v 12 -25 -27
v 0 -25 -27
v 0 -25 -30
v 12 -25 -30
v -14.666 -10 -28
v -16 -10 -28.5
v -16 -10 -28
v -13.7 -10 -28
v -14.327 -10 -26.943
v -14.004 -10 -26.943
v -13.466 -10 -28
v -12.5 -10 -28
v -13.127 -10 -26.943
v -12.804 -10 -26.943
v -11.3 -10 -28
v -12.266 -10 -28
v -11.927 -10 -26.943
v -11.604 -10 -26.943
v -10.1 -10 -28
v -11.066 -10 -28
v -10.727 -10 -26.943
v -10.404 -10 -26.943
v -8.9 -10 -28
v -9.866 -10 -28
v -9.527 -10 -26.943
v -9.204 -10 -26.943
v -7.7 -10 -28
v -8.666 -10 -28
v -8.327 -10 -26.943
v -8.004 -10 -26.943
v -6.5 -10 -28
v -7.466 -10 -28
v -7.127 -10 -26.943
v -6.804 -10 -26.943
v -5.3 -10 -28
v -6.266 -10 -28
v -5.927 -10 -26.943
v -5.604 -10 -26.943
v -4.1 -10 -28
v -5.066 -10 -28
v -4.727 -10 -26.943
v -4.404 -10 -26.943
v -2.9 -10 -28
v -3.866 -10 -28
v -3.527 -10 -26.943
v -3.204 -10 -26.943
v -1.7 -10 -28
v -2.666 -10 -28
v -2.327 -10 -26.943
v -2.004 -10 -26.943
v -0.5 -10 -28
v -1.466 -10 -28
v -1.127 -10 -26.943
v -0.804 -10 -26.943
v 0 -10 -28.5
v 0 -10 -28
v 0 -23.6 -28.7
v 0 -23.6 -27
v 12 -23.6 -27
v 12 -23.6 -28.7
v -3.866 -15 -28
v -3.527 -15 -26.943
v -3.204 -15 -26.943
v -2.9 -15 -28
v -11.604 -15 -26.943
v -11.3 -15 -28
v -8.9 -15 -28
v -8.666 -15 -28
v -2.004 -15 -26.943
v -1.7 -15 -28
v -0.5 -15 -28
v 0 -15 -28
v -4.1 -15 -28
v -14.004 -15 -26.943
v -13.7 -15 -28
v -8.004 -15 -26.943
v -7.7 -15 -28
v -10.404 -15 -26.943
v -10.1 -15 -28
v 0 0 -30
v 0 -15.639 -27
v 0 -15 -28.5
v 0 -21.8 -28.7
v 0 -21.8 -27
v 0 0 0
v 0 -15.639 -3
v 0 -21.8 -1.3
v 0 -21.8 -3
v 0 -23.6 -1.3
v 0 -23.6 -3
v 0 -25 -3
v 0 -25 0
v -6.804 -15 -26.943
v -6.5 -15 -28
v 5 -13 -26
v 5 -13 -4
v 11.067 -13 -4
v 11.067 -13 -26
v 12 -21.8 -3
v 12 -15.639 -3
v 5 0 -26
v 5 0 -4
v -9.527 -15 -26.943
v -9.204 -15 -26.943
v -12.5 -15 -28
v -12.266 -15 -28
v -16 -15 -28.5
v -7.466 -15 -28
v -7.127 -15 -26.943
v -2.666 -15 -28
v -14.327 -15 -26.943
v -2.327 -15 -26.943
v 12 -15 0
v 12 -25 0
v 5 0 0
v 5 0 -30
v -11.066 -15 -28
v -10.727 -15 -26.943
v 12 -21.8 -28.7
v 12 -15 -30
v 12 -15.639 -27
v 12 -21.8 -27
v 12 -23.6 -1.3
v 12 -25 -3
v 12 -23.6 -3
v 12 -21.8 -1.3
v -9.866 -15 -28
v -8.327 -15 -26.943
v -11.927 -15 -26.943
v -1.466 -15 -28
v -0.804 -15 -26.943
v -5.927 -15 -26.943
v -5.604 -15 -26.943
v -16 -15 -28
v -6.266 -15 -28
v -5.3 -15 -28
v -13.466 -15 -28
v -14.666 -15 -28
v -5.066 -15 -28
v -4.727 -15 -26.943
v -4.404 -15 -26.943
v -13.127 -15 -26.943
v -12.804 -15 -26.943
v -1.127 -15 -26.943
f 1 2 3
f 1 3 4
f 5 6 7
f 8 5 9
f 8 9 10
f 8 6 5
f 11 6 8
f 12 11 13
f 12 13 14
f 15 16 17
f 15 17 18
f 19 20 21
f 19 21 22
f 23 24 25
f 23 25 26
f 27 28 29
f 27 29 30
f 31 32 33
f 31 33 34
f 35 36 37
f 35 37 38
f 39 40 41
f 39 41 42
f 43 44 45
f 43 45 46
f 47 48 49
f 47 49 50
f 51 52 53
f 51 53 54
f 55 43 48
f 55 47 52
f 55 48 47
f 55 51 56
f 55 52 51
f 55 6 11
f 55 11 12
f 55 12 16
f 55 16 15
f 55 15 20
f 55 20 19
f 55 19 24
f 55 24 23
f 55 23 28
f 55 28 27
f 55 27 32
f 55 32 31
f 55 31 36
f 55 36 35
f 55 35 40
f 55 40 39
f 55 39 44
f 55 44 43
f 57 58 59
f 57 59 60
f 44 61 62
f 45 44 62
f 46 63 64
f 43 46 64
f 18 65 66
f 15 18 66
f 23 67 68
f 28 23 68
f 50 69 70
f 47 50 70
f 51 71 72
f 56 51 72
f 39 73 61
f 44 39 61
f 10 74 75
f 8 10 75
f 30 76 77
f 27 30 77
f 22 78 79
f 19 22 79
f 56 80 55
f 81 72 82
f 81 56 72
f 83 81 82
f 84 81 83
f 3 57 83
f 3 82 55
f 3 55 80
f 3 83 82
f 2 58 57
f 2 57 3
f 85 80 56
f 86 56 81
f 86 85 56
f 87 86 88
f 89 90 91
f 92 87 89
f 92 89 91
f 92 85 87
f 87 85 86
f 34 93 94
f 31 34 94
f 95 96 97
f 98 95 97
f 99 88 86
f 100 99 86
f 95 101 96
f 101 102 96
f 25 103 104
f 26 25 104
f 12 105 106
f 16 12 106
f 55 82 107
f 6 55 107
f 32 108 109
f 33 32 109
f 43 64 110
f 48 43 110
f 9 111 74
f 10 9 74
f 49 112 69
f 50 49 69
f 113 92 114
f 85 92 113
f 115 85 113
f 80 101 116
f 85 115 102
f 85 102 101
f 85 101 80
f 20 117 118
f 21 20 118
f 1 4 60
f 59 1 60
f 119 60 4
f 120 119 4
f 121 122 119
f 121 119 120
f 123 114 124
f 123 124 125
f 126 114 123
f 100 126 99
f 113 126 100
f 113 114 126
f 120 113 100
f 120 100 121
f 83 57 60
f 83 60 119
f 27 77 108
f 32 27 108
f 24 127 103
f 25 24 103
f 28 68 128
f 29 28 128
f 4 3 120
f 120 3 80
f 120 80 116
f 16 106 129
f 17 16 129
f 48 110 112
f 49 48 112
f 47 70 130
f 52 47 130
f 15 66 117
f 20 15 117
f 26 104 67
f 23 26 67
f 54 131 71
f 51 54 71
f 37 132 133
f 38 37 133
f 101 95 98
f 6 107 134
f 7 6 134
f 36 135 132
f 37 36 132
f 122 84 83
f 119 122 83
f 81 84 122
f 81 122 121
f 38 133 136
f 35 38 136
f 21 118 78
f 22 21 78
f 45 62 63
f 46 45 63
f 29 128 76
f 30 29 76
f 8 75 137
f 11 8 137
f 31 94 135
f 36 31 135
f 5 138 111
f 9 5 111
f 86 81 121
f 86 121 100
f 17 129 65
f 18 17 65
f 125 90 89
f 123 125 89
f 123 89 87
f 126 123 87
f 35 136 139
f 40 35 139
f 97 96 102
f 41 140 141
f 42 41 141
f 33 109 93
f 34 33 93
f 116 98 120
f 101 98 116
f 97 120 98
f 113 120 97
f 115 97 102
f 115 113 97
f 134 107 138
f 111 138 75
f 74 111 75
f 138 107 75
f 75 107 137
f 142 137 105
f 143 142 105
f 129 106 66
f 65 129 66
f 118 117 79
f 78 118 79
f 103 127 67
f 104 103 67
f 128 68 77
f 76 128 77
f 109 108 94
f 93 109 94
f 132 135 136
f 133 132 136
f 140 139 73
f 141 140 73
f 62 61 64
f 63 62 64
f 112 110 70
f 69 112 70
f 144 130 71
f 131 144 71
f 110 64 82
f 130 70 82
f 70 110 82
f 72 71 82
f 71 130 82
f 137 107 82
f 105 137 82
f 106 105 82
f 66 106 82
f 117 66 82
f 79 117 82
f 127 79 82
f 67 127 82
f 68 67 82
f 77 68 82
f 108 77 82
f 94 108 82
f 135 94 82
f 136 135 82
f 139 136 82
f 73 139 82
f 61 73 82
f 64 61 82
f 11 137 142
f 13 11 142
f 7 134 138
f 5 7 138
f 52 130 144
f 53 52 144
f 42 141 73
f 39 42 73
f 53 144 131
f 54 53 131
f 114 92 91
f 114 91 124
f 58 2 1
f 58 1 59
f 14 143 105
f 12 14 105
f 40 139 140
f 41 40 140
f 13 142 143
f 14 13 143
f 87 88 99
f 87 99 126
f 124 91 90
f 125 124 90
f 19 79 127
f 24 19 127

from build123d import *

# Parameters (mm, degrees)
BOSS_EXTRUDE1_DEPTH = 30
SKETCH4_W           = 24
SKETCH4_H           = 14
CUT_EXTRUDE2_DEPTH  = 25
SKETCH5_W           = 1.7
SKETCH5_H           = 1.8
CUT_EXTRUDE3_DEPTH  = 15
CUT_EXTRUDE4_DEPTH  = 11
BOSS_EXTRUDE2_DEPTH = 5


with BuildPart() as part:
    # Sketch1 → Boss-Extrude1 (new body)
    with BuildSketch(Plane.XY):
        Polygon((0, 0), (0, -25), (12, -25), (12, -15), (5, 0), align=None)
    extrude(amount=-BOSS_EXTRUDE1_DEPTH)

    # Sketch4 → Cut-Extrude2 (cut)
    with BuildSketch(Plane.ZY):
        with Locations((-15, -22.638599401)):
            Rectangle(SKETCH4_W, SKETCH4_H)
    extrude(amount=-CUT_EXTRUDE2_DEPTH, mode=Mode.SUBTRACT)

    # Sketch5 → Cut-Extrude3 (cut)
    with BuildSketch(Plane.ZY):
        with Locations((-2.15, -22.7)):
            Rectangle(SKETCH5_W, SKETCH5_H)
    cut_extrude3 = extrude(amount=-CUT_EXTRUDE3_DEPTH, mode=Mode.SUBTRACT)

    # Mirror1: Cut-Extrude3 across plane
    add(cut_extrude3.mirror(Plane.XY.offset(-15)), mode=Mode.SUBTRACT)

    # Sketch6 → Cut-Extrude4 (cut, symmetric)
    with BuildSketch(Plane.XY.offset(-15)):
        Polygon((5, 0), (5, -13), (11.066666667, -13), align=None)
    extrude(amount=CUT_EXTRUDE4_DEPTH, both=True, mode=Mode.SUBTRACT)

    # Sketch7 → Boss-Extrude2 (add)
    with BuildSketch(Plane(origin=(0, -15, 0), x_dir=(1, 0, 0), z_dir=(0, 1, 0))):
        Polygon((0, 28.5), (-16, 28.5), (-16, 28), (-14.9, 28), (-14.665549599, 28), (-14.327251213, 26.943471152), (-14.004330027, 26.943471152), (-13.7, 28), (-13.465549599, 28), (-13.127251213, 26.943471152), (-12.804330027, 26.943471152), (-12.5, 28), (-12.265549599, 28), (-11.927251213, 26.943471152), (-11.604330027, 26.943471152), (-11.3, 28), (-11.065549599, 28), (-10.727251213, 26.943471152), (-10.404330027, 26.943471152), (-10.1, 28), (-9.865549599, 28), (-9.527251213, 26.943471152), (-9.204330027, 26.943471152), (-8.9, 28), (-8.665549599, 28), (-8.327251213, 26.943471152), (-8.004330027, 26.943471152), (-7.7, 28), (-7.465549599, 28), (-7.127251213, 26.943471152), (-6.804330027, 26.943471152), (-6.5, 28), (-6.265549599, 28), (-5.927251213, 26.943471152), (-5.604330027, 26.943471152), (-5.3, 28), (-5.065549599, 28), (-4.727251213, 26.943471152), (-4.404330027, 26.943471152), (-4.1, 28), (-3.865549599, 28), (-3.527251213, 26.943471152), (-3.204330027, 26.943471152), (-2.9, 28), (-2.665549599, 28), (-2.327251213, 26.943471152), (-2.004330027, 26.943471152), (-1.7, 28), (-1.465549599, 28), (-1.127251213, 26.943471152), (-0.804330027, 26.943471152), (-0.5, 28), (0, 28), align=None)
    extrude(amount=BOSS_EXTRUDE2_DEPTH)


solid = part.part
